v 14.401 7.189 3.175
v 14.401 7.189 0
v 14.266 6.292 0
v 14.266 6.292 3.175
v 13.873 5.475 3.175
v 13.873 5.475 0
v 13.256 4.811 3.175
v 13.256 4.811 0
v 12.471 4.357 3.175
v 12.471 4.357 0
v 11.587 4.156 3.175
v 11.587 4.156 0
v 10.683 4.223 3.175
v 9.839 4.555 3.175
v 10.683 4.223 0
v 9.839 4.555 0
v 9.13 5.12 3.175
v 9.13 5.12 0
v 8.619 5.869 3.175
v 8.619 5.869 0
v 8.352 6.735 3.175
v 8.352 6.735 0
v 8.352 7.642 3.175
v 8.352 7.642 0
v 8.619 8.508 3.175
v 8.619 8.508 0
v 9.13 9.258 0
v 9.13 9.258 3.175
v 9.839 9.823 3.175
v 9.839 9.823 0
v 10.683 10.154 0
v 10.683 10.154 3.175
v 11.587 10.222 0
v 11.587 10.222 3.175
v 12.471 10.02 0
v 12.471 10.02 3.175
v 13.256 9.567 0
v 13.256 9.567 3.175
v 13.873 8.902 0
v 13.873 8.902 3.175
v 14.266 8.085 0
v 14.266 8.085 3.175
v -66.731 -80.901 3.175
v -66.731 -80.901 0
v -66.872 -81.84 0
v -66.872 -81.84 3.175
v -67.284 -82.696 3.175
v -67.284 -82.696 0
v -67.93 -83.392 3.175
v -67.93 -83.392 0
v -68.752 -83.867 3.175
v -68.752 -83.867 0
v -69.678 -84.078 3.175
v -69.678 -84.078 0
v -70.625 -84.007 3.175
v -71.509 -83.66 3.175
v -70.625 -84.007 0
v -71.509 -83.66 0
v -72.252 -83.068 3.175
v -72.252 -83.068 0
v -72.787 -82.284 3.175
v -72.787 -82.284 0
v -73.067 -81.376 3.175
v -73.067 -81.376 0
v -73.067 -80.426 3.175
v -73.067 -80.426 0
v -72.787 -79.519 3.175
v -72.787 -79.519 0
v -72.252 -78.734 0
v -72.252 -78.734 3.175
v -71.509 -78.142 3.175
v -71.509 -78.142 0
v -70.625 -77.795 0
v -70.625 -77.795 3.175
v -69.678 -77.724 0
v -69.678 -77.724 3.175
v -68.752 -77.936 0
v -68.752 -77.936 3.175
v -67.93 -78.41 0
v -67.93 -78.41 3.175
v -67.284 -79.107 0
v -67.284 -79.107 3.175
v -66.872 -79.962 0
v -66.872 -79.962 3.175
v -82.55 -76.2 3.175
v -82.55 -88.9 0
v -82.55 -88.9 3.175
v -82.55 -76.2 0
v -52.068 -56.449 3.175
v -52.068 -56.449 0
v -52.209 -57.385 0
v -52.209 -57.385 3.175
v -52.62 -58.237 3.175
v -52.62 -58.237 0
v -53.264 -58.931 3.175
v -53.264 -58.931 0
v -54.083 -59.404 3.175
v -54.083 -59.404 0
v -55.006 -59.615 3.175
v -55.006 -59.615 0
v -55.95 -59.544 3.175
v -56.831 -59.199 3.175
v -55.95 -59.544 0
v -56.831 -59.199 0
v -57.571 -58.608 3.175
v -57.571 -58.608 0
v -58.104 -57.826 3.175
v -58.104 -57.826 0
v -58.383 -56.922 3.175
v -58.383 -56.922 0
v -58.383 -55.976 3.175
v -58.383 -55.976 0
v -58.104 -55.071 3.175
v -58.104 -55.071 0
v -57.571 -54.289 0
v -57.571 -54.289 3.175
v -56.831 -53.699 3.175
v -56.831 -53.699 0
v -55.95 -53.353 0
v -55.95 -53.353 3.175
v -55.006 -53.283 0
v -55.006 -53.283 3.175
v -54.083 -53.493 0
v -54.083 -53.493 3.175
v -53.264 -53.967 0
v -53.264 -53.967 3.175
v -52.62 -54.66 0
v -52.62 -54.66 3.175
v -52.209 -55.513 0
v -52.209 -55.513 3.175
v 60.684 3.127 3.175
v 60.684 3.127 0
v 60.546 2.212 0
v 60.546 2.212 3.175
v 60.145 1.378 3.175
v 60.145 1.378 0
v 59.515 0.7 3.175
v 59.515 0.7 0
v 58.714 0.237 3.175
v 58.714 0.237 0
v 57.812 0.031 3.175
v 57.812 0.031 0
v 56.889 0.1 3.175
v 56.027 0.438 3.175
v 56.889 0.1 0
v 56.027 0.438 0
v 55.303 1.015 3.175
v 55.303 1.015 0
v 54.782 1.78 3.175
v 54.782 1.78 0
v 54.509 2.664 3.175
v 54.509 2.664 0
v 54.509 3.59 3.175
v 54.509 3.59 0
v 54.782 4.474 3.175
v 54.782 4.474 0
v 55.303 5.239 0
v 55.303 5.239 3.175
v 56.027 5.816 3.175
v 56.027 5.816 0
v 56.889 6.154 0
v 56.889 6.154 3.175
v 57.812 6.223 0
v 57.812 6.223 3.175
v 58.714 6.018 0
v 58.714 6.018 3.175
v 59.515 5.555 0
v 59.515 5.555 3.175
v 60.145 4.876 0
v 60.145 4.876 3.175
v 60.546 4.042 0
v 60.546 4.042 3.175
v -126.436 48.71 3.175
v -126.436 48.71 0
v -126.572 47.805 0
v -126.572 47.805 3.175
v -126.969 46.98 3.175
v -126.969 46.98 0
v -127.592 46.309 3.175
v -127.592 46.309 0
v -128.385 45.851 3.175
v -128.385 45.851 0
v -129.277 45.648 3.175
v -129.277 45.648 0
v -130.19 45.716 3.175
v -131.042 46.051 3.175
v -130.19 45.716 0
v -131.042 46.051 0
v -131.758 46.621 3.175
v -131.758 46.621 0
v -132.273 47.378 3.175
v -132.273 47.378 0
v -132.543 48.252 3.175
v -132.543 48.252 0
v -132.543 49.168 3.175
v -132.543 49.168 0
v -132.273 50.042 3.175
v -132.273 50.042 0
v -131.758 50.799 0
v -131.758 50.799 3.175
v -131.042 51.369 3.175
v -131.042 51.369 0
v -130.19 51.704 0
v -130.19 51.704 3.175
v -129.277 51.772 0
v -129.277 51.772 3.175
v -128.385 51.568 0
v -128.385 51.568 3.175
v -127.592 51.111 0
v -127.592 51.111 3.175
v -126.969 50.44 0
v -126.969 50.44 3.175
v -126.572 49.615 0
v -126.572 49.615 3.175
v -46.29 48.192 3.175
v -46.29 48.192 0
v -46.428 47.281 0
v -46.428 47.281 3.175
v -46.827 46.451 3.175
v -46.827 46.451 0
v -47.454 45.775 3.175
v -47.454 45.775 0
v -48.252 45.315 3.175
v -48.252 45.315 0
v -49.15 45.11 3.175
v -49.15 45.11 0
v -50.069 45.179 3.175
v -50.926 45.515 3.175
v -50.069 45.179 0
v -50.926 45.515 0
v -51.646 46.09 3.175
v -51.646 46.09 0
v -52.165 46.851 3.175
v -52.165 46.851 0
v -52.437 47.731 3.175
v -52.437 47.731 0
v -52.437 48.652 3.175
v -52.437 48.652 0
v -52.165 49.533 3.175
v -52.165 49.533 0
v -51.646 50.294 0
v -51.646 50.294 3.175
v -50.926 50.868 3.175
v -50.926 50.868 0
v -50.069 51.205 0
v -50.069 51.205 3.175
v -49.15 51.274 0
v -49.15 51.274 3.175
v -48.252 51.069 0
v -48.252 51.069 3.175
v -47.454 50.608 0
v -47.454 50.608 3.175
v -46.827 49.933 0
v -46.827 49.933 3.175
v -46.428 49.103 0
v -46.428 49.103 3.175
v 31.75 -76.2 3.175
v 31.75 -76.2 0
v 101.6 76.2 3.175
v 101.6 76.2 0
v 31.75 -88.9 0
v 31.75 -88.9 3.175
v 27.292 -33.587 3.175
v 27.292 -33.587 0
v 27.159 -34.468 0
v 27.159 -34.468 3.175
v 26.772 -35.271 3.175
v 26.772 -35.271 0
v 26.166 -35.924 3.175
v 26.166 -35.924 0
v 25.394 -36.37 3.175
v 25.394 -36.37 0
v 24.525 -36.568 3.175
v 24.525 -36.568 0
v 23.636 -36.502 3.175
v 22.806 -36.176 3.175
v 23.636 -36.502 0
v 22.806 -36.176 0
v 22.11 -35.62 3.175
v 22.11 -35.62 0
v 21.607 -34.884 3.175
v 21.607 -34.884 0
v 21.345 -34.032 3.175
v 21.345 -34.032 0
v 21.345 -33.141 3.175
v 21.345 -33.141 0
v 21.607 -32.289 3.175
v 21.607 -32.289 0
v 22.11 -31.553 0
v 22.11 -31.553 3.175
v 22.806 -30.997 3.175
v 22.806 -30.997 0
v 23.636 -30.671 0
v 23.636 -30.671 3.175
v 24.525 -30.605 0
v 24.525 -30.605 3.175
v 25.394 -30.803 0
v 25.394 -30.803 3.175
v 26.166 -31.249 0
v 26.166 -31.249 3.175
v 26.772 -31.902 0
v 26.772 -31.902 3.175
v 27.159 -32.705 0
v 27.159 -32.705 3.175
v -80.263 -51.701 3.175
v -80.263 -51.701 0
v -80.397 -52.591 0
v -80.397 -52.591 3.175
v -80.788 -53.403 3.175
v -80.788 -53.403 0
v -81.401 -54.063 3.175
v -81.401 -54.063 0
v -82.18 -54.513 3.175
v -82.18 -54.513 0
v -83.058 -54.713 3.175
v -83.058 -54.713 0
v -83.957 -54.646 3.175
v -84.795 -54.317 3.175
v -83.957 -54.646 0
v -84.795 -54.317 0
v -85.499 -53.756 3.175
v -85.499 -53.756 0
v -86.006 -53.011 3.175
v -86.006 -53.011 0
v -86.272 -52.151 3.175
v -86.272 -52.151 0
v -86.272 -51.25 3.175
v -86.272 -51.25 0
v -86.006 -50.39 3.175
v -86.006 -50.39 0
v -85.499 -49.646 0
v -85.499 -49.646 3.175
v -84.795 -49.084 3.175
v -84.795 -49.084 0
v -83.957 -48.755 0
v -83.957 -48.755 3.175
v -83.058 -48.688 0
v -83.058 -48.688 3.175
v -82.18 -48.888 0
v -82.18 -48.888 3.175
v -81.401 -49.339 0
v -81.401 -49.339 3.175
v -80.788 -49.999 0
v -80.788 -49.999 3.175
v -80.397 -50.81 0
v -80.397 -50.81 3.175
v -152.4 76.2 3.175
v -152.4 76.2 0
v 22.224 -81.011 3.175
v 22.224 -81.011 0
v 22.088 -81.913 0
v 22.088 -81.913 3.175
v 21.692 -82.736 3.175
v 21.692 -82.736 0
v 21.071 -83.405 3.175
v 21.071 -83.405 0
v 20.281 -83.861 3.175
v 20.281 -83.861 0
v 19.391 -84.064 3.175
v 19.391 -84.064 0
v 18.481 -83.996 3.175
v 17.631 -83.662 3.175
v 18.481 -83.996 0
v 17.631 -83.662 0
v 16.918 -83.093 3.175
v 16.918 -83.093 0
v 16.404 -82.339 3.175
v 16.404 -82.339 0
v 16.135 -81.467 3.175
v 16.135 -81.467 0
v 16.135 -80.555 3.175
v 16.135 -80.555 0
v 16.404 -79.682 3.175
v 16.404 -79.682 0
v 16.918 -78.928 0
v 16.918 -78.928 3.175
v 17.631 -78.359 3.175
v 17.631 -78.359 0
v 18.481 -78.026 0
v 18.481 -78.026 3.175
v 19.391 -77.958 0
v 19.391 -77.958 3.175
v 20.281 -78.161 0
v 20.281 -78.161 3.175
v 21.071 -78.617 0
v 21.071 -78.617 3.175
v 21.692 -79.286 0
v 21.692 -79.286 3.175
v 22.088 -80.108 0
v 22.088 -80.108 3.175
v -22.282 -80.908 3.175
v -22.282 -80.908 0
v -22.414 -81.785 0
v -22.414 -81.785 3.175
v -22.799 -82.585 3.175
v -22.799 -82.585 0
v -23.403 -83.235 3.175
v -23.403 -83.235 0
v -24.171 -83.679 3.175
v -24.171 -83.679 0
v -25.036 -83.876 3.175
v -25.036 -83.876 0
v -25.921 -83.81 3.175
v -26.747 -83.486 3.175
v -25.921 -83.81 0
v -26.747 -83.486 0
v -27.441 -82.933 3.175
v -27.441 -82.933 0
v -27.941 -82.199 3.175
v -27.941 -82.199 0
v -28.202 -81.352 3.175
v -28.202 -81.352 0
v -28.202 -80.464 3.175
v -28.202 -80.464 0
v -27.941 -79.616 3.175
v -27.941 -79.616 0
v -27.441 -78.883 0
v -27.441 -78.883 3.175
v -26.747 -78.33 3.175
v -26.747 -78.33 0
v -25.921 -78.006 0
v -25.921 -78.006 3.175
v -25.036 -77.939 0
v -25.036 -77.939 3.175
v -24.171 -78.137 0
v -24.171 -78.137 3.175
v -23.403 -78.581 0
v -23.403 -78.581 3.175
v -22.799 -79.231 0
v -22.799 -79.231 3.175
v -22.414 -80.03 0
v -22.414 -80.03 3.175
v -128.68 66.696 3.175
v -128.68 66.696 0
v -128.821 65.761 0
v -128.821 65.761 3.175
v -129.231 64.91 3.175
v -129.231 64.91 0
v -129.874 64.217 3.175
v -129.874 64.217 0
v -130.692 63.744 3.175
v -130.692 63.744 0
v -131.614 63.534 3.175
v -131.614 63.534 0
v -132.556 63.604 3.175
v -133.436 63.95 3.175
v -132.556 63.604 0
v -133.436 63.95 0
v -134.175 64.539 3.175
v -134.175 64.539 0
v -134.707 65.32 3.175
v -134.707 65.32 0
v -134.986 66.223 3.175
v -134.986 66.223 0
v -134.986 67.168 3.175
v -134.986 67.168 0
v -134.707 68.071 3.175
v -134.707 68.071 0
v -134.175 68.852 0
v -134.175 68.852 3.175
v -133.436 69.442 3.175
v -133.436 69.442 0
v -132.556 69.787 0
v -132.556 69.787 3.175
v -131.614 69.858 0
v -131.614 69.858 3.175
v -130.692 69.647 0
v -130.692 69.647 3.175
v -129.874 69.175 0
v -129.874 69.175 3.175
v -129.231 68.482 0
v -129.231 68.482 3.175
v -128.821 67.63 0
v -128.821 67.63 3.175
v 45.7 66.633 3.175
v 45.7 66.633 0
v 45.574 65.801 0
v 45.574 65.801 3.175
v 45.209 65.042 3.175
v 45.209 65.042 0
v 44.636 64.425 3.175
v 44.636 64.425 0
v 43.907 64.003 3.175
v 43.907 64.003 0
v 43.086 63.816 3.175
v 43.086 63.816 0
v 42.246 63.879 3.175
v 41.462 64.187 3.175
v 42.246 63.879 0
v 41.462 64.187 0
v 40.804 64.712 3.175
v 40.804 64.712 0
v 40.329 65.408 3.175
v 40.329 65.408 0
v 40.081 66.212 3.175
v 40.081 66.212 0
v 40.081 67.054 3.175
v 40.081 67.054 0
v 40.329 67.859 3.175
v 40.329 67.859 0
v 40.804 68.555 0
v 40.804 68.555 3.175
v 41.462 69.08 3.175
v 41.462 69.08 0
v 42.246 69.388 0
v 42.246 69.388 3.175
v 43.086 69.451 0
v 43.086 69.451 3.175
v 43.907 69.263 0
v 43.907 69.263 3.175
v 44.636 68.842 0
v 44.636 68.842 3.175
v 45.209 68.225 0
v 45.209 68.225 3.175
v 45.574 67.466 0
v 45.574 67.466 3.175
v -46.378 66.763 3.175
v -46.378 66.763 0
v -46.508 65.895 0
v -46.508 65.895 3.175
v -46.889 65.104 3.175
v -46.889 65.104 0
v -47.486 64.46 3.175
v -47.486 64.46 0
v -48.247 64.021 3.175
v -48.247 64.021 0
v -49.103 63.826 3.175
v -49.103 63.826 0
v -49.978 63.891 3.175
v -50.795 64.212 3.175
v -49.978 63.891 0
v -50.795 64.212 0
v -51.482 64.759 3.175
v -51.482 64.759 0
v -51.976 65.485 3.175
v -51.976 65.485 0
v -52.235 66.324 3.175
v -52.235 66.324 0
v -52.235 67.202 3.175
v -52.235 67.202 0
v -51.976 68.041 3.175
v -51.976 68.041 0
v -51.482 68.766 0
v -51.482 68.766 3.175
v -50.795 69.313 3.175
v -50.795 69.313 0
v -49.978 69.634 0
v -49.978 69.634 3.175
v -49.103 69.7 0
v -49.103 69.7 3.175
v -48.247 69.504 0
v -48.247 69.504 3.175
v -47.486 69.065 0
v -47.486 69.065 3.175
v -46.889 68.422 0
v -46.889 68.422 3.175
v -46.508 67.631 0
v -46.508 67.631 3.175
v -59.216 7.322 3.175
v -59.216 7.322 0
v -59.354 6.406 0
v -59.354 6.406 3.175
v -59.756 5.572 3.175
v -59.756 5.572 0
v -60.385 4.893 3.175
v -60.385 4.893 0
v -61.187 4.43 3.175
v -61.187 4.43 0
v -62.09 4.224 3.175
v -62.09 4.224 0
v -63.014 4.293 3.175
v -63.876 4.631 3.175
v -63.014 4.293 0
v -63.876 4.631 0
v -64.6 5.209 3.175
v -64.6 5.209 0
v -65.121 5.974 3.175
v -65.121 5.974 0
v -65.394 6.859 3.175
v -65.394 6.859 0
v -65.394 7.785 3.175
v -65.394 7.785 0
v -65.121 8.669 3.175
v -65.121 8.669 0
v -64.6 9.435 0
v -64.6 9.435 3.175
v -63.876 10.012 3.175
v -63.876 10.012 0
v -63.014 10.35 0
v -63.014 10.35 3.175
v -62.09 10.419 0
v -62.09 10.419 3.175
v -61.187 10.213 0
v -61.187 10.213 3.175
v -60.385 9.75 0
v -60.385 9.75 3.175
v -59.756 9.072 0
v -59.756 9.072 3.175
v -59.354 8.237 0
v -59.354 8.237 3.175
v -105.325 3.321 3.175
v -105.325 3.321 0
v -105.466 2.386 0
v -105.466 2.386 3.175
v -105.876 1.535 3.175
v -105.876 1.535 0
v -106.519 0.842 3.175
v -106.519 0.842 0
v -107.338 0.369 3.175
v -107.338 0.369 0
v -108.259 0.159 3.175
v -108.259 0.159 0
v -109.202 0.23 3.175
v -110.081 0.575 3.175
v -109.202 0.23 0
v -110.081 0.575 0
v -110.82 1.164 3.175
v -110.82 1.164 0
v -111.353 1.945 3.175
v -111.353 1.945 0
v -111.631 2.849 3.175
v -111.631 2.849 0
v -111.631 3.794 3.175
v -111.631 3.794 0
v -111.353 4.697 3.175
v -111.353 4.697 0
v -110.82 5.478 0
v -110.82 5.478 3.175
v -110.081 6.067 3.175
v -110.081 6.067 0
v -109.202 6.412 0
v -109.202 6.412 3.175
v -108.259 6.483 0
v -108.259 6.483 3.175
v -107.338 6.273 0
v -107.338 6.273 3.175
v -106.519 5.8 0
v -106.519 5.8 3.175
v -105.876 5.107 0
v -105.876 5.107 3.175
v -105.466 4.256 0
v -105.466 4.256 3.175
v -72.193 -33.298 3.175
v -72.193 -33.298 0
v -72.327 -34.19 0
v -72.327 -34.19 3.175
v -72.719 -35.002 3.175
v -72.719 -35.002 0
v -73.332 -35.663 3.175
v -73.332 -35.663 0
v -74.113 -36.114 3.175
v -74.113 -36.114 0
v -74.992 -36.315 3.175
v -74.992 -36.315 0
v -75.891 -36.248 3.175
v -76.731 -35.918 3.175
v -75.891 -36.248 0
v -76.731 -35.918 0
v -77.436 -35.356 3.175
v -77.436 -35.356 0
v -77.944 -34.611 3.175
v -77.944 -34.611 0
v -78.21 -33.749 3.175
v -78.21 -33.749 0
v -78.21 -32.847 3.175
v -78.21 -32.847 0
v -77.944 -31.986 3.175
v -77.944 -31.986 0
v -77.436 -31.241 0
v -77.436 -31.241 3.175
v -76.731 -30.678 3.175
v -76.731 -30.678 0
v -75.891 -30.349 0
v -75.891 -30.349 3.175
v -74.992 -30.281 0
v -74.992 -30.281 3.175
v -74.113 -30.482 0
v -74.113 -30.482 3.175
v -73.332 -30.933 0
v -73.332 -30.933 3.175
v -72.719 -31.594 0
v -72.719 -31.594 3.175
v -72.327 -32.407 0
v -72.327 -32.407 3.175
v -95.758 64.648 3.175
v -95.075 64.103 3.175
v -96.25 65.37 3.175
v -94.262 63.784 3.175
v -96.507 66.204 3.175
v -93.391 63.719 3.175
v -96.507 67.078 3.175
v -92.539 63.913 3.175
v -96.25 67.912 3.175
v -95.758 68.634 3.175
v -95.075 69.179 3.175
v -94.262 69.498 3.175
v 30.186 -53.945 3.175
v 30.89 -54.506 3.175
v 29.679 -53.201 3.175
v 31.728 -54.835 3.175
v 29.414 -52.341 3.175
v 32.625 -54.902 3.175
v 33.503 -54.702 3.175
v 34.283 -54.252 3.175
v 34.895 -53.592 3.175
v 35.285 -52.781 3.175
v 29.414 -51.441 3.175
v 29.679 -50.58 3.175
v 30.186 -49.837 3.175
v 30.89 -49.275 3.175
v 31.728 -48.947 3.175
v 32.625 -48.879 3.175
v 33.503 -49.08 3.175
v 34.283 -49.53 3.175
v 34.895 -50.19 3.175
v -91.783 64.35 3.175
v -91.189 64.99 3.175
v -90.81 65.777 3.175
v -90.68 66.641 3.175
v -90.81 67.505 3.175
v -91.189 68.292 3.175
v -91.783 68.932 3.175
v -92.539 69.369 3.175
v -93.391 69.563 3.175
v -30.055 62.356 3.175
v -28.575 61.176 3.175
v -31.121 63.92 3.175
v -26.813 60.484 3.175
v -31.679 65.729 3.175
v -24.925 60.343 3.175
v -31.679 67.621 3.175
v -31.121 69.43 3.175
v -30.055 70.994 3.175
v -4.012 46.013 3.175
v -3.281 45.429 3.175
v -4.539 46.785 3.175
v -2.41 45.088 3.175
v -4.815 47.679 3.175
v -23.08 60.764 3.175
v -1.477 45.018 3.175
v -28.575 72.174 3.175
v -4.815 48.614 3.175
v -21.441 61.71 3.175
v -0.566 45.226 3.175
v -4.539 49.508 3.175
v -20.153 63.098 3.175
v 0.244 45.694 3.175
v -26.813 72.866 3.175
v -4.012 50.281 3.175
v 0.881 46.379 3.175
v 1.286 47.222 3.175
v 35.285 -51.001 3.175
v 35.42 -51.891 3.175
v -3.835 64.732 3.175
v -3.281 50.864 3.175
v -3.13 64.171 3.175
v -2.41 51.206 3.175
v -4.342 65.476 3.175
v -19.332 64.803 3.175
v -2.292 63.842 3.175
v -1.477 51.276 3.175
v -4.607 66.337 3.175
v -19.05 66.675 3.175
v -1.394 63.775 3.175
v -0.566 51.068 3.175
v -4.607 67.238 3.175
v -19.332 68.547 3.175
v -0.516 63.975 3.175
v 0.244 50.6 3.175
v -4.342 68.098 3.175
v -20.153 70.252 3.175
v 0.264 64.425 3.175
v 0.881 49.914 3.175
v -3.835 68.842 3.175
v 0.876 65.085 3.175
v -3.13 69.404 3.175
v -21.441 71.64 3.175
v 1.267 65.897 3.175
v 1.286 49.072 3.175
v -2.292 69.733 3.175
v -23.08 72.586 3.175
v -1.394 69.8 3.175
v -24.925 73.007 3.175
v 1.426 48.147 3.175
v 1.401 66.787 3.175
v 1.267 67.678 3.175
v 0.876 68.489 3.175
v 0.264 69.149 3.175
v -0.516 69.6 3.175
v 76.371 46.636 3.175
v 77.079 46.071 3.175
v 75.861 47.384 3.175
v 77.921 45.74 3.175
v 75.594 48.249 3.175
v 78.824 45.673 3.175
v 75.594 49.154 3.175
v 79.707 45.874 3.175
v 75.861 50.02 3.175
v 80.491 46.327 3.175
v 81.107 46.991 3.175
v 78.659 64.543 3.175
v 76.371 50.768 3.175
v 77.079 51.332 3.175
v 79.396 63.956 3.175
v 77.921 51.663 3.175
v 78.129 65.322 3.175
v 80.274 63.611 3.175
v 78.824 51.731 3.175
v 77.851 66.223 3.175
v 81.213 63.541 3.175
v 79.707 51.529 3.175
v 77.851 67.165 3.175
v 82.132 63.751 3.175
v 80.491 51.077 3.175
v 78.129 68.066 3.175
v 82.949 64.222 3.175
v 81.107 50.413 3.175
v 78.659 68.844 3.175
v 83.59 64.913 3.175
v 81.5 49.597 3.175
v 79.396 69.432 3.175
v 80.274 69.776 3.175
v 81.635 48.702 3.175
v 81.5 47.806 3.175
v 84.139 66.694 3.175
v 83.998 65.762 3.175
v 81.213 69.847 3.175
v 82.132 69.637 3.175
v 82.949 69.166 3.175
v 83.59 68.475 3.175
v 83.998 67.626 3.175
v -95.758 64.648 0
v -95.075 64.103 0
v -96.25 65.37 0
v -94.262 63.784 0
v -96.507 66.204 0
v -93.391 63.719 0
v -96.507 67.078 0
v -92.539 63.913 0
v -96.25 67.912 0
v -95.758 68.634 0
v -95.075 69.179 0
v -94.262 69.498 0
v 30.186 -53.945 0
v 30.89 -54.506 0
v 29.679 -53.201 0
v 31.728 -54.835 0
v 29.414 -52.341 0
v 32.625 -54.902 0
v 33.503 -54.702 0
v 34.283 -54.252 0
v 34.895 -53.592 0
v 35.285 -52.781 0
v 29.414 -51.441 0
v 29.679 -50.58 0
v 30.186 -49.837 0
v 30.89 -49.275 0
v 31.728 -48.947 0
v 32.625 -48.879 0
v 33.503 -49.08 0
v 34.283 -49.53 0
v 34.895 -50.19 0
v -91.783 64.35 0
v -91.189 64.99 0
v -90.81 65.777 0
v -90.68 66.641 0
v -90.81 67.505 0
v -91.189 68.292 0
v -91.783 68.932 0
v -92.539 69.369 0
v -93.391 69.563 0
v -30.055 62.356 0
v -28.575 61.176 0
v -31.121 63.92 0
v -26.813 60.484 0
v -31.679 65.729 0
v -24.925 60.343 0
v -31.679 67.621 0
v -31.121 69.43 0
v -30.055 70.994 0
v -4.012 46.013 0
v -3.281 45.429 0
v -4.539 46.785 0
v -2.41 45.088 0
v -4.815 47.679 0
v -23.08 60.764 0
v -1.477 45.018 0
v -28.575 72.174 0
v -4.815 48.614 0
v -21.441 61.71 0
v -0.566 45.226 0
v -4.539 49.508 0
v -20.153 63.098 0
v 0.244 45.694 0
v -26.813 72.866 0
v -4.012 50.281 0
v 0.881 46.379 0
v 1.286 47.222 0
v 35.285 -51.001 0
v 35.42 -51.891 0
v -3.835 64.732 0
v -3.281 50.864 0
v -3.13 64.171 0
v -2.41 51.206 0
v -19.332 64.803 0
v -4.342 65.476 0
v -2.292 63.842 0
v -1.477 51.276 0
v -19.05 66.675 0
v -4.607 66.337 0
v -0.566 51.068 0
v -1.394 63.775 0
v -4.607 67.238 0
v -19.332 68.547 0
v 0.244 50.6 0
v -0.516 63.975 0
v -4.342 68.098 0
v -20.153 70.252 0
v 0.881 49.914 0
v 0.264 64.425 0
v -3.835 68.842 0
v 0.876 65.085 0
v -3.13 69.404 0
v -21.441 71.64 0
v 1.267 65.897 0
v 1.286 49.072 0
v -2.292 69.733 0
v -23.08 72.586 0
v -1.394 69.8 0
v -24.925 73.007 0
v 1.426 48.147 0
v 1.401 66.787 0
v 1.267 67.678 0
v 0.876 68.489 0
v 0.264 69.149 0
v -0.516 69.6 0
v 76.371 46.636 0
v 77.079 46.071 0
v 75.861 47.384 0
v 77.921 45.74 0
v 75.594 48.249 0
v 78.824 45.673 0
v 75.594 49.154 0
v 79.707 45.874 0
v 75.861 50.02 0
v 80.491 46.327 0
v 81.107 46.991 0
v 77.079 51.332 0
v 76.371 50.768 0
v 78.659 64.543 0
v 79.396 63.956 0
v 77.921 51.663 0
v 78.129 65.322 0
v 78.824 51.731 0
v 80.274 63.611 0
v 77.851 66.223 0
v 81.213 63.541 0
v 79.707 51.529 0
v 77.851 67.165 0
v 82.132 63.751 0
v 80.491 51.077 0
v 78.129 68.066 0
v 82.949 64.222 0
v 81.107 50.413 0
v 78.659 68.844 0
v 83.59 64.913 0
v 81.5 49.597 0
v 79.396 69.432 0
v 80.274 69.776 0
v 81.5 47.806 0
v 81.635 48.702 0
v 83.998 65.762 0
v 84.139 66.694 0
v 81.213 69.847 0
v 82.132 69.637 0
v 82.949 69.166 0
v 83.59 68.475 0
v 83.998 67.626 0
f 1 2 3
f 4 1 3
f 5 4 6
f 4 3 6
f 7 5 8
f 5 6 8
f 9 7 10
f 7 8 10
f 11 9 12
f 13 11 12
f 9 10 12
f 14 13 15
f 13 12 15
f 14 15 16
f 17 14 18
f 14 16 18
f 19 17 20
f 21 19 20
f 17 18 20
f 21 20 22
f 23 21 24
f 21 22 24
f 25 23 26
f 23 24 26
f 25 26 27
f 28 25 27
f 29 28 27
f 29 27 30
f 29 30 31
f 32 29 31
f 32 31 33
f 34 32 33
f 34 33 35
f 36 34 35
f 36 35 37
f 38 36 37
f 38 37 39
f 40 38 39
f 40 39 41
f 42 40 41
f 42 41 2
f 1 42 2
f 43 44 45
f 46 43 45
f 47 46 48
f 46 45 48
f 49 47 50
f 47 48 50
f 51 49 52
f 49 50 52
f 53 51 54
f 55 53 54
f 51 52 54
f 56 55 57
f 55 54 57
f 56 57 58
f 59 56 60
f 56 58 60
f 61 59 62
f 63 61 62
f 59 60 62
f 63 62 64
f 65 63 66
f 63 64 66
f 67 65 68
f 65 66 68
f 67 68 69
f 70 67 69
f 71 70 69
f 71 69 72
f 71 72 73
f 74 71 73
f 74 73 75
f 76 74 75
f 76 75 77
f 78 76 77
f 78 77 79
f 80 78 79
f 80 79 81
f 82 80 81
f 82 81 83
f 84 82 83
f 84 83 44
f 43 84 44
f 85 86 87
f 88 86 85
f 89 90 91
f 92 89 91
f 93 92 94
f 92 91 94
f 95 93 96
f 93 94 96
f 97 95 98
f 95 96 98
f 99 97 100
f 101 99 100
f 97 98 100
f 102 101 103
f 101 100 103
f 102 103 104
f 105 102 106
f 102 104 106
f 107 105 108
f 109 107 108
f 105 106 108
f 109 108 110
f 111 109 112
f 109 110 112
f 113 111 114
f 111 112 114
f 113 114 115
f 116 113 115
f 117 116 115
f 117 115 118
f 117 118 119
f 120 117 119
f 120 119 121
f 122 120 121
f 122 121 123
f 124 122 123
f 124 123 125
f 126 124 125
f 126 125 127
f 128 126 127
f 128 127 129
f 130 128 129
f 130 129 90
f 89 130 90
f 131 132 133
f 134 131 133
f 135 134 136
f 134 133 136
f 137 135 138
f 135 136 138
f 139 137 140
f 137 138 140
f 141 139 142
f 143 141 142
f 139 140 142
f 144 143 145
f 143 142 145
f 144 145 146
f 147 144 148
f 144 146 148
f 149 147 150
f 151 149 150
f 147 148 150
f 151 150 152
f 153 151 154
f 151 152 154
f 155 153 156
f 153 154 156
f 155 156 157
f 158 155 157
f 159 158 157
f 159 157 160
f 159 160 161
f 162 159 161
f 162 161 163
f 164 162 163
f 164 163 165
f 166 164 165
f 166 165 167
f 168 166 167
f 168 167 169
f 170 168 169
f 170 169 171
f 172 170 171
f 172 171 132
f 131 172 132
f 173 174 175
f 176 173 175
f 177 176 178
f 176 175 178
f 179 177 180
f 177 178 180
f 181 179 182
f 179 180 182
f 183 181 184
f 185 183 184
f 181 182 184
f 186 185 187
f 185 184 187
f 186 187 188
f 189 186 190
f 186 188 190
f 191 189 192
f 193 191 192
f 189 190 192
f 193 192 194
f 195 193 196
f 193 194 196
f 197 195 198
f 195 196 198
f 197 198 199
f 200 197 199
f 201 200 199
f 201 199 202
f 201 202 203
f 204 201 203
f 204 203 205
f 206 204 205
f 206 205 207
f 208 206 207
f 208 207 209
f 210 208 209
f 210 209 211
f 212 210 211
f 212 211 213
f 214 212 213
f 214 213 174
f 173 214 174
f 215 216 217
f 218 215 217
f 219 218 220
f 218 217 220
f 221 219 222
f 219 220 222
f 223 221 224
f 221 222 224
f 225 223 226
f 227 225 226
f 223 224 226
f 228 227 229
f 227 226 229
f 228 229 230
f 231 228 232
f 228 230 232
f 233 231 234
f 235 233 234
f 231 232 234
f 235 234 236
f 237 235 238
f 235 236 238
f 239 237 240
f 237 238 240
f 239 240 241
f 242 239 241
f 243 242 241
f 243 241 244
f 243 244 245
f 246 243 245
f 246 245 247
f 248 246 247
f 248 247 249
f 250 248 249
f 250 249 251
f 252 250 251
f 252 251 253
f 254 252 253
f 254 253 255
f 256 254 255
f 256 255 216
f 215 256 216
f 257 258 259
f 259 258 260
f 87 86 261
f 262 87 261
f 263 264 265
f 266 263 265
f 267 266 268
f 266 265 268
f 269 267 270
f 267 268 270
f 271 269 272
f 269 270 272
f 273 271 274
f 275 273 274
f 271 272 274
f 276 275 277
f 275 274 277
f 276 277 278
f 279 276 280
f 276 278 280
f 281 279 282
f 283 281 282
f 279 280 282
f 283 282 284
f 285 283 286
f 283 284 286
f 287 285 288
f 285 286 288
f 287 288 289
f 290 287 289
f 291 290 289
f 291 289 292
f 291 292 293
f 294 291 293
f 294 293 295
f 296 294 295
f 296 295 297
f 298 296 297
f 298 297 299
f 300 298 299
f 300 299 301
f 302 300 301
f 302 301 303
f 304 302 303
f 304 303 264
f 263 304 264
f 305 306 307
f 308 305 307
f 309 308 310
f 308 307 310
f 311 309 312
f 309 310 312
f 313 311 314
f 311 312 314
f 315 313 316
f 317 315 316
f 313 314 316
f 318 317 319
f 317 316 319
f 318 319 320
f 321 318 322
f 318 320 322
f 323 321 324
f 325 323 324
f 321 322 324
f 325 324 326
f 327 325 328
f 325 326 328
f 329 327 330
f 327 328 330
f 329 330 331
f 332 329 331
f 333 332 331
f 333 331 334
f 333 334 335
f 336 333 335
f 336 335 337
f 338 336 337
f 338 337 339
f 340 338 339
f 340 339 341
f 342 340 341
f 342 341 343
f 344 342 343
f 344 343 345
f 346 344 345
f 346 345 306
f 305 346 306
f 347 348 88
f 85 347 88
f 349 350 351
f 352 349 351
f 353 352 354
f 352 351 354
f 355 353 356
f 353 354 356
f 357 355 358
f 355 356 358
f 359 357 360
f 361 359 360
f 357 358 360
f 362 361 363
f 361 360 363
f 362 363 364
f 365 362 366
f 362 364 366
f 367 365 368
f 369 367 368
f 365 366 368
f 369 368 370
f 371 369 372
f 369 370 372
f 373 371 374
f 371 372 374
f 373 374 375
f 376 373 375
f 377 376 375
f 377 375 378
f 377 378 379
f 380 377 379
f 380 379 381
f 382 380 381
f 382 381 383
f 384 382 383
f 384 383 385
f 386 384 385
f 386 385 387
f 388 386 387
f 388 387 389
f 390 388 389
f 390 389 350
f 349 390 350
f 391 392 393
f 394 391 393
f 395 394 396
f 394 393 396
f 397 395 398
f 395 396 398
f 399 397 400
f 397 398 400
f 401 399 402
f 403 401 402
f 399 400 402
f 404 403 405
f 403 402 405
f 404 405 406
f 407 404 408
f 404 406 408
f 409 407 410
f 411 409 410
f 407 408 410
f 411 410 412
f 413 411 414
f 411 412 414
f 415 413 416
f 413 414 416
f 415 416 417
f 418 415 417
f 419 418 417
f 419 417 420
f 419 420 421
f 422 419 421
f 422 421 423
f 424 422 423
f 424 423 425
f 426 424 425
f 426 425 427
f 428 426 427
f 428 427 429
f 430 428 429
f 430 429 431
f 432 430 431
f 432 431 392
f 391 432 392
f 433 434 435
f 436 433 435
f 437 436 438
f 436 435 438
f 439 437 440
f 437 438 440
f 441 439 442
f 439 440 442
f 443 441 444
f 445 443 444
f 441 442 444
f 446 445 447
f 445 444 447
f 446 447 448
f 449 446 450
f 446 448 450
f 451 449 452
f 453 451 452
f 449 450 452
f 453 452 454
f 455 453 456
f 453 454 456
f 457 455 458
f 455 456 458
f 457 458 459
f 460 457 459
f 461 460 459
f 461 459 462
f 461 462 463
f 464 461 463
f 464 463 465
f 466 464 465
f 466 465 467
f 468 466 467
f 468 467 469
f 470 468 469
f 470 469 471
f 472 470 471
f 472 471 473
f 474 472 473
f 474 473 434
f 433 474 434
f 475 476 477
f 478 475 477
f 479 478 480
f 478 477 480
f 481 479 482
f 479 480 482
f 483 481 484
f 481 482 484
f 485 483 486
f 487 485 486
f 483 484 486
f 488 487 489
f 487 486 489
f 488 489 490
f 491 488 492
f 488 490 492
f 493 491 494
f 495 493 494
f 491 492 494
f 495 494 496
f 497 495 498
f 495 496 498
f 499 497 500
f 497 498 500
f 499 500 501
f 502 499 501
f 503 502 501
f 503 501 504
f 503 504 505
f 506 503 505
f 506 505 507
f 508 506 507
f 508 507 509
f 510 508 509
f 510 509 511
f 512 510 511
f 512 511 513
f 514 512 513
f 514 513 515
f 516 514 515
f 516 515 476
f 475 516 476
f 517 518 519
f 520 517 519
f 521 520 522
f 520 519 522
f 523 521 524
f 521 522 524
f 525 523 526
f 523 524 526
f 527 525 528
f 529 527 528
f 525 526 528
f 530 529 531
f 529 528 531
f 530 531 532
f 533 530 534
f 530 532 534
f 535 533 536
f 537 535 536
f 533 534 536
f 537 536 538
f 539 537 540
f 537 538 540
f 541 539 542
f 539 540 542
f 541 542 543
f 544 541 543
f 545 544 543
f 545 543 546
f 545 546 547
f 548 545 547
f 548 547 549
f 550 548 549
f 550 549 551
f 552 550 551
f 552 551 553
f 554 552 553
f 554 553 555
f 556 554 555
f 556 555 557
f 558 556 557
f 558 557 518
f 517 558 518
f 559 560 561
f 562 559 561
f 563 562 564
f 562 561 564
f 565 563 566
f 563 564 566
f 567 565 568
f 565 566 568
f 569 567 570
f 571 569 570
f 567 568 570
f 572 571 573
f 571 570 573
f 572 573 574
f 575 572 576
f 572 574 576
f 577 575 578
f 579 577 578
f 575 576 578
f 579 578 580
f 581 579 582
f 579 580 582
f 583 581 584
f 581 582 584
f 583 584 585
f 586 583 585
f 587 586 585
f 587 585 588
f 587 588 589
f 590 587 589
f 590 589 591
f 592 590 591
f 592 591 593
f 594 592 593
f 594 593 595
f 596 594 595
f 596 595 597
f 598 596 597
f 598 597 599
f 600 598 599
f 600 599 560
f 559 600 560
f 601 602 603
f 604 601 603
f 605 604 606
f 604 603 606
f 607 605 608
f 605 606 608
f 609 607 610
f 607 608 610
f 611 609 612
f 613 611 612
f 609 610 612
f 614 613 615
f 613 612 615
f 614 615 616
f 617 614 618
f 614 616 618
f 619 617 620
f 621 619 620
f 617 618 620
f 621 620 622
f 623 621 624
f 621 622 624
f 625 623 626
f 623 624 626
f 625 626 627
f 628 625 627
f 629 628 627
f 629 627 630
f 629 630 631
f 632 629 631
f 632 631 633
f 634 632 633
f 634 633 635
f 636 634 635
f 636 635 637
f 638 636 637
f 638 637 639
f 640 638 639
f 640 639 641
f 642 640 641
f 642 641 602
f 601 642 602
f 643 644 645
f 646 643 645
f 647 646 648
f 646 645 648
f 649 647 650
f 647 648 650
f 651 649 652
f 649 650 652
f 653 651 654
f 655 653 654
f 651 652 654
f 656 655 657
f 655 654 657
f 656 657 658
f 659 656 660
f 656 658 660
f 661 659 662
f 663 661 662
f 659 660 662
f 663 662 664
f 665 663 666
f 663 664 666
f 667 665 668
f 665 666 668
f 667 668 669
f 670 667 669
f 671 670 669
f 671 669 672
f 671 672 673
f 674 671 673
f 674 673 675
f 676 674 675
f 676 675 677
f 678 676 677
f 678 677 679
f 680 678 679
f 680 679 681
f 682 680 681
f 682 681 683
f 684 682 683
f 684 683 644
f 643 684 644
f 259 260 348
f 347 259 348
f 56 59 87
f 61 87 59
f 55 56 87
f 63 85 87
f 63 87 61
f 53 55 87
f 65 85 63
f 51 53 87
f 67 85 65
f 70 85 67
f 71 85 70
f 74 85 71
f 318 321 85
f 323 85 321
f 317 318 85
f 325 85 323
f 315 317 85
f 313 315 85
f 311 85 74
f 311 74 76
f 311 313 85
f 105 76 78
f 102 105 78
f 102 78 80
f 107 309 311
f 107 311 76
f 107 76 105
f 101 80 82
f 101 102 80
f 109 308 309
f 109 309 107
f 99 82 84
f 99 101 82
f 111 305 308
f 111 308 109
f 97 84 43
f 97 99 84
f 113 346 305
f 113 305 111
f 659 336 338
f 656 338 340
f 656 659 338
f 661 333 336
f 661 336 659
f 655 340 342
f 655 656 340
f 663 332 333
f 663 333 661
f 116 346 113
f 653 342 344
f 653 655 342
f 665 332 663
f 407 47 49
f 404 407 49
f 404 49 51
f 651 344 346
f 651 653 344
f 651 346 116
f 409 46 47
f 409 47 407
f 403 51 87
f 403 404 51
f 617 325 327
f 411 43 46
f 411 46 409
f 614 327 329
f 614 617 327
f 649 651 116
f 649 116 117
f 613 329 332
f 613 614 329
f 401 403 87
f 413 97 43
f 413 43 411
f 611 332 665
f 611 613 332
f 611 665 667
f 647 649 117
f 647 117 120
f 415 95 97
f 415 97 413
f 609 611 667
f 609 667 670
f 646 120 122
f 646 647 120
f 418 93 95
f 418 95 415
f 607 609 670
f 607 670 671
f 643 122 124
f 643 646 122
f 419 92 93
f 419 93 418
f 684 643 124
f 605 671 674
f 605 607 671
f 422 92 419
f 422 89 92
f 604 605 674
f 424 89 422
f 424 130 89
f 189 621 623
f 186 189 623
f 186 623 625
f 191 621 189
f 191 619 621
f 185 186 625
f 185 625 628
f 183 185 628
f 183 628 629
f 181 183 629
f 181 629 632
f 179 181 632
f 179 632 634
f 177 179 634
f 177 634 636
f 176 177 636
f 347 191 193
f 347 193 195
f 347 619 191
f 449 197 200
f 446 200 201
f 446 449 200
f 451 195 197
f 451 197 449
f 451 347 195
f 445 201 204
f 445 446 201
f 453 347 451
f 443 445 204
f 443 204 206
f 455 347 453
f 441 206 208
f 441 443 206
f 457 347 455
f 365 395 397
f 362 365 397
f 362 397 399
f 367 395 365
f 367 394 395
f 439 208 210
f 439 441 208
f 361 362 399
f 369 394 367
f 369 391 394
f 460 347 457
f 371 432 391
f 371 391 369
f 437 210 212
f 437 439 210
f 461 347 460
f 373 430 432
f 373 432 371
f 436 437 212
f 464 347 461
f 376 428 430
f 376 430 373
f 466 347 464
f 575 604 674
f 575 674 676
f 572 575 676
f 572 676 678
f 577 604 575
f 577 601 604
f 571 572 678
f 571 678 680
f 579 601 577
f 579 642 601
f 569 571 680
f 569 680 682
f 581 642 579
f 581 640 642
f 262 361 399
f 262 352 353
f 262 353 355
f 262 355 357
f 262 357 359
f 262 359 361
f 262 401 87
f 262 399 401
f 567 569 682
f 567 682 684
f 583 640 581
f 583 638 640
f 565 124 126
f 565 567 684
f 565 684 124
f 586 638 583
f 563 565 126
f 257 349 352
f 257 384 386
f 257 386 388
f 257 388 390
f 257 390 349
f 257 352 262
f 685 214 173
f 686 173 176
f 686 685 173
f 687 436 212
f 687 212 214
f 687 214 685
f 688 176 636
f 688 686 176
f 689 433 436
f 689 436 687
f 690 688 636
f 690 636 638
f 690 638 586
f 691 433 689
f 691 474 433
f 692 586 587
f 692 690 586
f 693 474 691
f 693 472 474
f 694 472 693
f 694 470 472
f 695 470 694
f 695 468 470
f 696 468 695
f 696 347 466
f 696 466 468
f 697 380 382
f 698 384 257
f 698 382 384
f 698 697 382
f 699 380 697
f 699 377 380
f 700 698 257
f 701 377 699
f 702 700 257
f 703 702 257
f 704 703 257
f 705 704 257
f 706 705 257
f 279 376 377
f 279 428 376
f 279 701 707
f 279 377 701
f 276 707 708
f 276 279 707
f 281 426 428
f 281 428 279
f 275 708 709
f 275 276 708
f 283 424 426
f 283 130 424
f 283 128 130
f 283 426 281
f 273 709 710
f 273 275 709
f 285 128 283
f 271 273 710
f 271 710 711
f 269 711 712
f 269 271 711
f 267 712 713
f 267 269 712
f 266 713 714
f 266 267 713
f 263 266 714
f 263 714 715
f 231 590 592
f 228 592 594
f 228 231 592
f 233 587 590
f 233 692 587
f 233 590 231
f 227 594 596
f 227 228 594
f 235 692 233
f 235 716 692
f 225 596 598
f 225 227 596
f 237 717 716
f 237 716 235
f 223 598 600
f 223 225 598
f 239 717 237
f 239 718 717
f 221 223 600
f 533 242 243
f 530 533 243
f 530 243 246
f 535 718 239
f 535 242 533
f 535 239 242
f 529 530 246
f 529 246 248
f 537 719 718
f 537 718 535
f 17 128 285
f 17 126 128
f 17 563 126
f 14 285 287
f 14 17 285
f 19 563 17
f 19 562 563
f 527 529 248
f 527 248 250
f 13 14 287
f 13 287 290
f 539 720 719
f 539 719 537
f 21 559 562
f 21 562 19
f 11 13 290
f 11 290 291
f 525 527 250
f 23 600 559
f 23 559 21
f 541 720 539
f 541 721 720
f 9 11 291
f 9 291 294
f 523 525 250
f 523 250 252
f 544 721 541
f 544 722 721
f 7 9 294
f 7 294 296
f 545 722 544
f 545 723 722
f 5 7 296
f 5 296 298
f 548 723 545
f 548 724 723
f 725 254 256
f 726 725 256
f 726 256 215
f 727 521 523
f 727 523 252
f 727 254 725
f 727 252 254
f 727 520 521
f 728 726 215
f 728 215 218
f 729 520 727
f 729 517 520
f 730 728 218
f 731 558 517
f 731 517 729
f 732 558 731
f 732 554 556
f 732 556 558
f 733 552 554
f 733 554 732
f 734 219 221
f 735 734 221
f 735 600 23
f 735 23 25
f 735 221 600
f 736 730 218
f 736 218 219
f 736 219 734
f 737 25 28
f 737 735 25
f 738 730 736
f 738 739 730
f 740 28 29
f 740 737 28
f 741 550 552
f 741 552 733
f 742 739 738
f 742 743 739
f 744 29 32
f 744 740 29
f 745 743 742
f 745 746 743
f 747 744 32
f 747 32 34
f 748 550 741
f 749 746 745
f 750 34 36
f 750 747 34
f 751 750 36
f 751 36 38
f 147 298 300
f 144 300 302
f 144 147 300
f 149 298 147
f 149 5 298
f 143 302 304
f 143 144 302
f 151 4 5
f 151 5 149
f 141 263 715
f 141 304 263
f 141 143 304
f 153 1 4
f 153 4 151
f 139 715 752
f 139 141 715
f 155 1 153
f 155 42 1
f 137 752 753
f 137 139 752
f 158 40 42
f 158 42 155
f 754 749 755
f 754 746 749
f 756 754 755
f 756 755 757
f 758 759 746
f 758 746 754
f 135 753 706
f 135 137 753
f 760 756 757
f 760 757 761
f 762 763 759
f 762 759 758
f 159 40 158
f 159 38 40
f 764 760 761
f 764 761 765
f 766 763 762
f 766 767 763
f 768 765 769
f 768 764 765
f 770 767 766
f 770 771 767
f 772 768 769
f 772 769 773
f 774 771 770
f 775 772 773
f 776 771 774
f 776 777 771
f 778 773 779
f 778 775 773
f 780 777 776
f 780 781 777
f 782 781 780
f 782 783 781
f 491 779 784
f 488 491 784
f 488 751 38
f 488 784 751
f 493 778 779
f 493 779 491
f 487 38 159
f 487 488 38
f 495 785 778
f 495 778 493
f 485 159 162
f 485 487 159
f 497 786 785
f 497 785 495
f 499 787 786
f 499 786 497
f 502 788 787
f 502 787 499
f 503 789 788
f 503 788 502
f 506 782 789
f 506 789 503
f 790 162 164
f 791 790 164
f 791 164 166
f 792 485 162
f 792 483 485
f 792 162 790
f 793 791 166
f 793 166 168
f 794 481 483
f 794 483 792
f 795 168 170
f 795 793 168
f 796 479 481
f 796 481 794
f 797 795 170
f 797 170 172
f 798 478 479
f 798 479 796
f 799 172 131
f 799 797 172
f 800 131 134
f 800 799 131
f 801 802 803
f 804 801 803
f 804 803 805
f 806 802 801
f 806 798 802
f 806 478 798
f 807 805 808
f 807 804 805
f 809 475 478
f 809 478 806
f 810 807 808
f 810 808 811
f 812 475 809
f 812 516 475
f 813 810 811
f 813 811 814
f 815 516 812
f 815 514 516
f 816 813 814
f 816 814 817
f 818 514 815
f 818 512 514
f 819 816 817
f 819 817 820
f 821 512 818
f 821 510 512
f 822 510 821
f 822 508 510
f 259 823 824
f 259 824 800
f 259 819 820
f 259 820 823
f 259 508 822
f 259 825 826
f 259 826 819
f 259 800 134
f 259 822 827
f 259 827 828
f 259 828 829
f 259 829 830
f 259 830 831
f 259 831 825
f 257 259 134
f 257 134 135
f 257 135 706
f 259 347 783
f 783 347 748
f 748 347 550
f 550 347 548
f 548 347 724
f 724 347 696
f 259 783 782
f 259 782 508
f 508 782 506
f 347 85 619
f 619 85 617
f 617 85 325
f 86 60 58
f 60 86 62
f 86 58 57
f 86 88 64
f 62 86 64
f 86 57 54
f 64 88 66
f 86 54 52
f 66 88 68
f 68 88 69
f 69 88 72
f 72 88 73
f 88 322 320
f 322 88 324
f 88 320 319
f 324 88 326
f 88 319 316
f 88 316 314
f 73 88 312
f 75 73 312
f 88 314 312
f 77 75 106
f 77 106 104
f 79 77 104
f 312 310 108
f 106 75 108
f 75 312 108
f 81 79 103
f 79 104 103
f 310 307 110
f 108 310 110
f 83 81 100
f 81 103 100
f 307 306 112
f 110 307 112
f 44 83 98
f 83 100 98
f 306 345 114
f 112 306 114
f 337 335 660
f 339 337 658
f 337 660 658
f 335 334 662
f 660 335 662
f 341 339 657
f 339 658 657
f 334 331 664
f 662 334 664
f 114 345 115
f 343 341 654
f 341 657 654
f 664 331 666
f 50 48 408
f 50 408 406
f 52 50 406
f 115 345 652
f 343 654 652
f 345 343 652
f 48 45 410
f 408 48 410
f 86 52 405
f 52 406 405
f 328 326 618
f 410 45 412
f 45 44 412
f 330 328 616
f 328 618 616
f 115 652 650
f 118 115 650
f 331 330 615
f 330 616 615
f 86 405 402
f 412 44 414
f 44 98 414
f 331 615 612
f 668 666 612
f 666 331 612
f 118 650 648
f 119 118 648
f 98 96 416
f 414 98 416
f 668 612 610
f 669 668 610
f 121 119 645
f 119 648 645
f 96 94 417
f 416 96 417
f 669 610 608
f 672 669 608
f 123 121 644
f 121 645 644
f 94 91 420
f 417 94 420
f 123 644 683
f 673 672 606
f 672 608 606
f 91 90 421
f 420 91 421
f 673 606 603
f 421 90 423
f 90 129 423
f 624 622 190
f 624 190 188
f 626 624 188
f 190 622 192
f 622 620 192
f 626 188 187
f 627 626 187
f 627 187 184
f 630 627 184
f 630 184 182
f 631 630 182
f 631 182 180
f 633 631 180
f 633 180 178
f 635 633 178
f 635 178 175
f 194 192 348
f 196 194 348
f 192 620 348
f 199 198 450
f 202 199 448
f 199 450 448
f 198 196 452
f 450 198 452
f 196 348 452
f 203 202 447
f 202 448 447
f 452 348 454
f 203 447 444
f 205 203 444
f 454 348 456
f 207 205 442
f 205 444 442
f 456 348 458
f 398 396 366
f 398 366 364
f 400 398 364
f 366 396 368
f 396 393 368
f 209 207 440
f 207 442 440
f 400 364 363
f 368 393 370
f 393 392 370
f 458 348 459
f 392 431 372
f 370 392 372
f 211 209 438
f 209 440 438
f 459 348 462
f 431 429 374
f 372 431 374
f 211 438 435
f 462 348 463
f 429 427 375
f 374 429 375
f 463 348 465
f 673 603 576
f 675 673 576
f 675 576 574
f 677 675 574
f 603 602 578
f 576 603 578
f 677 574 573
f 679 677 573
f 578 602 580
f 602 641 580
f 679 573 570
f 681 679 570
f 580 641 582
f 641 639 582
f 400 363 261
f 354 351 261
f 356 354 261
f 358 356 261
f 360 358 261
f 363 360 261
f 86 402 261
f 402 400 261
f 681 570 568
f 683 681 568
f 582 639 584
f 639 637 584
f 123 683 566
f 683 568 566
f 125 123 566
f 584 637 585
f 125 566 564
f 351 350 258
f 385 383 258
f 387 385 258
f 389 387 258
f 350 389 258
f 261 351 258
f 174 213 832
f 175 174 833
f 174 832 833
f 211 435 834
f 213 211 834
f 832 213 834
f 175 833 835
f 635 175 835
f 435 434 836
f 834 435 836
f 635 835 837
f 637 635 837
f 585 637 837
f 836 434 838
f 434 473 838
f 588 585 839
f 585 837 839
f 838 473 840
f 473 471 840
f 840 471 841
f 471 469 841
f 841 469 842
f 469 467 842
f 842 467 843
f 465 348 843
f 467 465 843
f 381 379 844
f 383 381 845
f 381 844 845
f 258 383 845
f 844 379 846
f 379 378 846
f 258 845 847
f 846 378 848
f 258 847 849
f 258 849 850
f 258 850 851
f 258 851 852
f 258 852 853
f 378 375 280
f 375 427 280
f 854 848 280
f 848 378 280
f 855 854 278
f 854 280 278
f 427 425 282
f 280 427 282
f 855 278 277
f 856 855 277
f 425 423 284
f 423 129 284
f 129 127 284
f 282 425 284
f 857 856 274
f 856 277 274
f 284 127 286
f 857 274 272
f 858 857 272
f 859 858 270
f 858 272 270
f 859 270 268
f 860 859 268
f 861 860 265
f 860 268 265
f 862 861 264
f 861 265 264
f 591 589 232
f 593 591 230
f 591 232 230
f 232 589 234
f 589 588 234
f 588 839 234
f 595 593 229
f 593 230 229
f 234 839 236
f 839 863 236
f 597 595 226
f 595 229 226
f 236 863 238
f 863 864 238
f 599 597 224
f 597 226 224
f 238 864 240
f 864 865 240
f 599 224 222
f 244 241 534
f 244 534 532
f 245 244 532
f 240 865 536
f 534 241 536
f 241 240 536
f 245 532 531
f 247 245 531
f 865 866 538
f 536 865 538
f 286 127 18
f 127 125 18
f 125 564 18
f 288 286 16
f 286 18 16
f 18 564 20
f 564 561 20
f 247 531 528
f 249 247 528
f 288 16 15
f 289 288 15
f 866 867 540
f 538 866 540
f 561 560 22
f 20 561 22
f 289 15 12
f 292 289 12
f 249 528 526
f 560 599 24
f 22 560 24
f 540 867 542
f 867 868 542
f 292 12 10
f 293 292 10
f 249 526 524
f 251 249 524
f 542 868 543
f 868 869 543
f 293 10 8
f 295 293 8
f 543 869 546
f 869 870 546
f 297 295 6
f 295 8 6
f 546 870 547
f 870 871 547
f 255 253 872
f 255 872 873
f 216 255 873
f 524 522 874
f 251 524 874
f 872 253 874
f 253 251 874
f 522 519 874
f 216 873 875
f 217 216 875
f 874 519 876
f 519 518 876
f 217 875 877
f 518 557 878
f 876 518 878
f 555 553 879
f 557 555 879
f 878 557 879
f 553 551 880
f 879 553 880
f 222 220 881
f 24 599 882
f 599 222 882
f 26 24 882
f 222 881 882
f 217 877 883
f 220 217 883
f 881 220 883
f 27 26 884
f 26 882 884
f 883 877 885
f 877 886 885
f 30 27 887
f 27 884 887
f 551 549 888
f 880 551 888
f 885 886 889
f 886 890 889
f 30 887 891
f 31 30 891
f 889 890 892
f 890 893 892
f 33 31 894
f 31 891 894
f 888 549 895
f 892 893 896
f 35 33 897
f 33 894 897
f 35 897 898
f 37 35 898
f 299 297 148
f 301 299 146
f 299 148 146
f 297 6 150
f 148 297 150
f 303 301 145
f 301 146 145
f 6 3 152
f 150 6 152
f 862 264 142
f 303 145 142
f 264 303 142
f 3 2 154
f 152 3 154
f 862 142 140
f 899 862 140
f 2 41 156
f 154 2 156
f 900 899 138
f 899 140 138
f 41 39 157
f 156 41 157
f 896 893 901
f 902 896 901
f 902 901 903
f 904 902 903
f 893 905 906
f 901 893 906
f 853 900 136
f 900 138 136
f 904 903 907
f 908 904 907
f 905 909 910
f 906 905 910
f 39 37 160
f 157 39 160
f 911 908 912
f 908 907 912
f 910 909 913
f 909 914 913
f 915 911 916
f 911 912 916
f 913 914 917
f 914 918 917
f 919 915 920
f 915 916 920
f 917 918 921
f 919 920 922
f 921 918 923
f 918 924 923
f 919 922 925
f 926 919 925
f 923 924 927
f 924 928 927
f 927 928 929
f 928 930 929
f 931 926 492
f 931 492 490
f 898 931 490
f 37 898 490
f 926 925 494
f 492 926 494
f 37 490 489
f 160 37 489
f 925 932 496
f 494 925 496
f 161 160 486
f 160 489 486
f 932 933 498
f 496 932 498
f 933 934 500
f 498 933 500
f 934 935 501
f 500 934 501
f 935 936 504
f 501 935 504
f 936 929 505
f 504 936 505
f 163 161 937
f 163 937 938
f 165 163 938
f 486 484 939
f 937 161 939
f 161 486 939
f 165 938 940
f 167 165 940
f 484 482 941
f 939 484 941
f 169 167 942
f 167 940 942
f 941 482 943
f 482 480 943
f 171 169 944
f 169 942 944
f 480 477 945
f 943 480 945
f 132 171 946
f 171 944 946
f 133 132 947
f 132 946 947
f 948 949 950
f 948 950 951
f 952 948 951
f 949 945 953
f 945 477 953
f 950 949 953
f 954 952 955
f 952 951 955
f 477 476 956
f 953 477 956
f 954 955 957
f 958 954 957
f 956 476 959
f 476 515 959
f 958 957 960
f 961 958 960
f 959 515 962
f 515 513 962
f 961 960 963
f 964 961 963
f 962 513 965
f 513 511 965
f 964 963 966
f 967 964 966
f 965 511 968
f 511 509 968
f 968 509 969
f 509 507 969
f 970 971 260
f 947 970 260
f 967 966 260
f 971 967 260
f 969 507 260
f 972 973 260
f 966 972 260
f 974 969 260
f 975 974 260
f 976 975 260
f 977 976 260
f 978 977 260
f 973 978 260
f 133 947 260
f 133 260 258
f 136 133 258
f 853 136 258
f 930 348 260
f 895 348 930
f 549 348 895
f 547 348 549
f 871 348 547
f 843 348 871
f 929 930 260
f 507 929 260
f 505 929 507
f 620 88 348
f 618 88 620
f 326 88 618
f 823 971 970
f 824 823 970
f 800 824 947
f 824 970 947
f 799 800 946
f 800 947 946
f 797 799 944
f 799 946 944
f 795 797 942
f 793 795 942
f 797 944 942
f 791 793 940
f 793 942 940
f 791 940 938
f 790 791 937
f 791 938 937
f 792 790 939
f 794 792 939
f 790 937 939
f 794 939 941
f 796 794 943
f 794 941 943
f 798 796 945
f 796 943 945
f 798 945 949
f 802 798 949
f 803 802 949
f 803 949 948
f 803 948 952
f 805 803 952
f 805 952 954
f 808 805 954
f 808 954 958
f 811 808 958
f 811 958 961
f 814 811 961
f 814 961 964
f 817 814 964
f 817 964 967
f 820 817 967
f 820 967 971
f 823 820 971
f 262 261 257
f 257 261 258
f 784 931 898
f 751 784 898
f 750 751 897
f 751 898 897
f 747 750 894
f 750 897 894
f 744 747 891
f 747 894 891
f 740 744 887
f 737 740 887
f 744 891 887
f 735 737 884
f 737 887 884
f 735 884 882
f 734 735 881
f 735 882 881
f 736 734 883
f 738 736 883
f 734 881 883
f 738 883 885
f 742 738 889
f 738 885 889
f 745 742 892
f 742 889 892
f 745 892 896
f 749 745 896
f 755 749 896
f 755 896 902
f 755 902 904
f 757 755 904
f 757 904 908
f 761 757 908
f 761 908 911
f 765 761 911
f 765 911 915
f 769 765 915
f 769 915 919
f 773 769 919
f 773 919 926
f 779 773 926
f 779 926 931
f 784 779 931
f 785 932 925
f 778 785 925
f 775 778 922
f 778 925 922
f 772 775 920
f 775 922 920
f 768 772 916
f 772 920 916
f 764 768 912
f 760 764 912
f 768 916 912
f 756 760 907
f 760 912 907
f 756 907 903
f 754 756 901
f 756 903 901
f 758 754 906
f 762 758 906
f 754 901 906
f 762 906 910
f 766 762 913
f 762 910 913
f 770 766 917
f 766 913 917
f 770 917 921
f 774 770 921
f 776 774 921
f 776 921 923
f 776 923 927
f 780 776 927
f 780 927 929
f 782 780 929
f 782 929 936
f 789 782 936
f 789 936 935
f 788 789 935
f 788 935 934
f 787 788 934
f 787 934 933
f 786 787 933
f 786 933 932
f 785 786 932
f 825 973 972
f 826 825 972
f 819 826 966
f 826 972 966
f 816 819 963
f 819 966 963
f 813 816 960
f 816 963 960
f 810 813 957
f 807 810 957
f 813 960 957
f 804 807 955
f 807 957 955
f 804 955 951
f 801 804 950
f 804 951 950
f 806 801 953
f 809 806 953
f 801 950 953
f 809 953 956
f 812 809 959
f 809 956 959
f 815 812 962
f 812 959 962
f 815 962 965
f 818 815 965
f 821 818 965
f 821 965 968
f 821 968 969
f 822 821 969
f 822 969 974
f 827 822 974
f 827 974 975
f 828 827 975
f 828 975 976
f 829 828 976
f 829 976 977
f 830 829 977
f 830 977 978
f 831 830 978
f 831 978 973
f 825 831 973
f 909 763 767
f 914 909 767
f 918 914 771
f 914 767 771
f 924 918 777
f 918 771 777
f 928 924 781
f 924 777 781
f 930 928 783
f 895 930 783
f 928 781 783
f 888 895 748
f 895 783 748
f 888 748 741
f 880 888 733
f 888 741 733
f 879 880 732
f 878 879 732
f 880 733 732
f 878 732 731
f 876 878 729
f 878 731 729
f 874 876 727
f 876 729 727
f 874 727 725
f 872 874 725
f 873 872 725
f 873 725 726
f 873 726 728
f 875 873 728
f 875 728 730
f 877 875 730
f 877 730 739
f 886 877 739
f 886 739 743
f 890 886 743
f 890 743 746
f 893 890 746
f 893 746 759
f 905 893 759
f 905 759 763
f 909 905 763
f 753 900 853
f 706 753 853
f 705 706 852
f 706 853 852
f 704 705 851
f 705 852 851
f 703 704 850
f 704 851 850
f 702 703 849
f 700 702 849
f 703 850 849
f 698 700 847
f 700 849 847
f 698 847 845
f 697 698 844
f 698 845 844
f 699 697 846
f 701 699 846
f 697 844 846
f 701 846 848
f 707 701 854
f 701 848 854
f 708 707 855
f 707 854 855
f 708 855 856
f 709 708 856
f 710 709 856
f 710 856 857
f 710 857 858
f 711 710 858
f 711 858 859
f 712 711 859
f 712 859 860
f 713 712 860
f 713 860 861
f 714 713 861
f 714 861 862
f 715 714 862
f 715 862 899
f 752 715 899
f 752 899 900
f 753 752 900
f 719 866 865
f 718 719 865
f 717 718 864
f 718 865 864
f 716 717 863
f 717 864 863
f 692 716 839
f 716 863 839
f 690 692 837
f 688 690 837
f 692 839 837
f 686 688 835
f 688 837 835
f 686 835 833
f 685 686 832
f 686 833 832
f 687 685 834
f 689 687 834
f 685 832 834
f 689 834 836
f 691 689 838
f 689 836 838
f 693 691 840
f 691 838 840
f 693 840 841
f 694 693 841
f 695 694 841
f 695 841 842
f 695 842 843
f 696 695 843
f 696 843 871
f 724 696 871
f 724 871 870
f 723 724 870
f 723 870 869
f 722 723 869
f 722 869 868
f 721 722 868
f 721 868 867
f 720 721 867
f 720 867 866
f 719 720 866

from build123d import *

# Parameters (mm, degrees)
F0_W     = 114.3
F0_H     = 12.7
F1_DEPTH = 3.175
F2_R     = 6.35
F3_DEPTH = 25.4
F4_R     = 3.021184
F4_R_2   = 3.02523
F4_R_3   = 3.170788
F4_R_4   = 3.070755
F4_R_5   = 3.170798
F4_R_6   = 2.930153
F4_R_7   = 2.94527
F4_R_8   = 3.090546
F4_R_9   = 3.106591
F4_R_10  = 2.82513
F4_R_11  = 3.161756
F4_R_12  = 3.03759
F4_R_13  = 3.13771
F4_R_14  = 3.0417
F4_R_15  = 3.104919
F4_R_16  = 2.990317
F4_R_17  = 3.019885
F5_DEPTH = 25.4
F6_R     = 3.185907
F6_R_2   = 2.97679
F6_R_3   = 3.061714
F7_DEPTH = 25.4
F8_R     = 3.175
F9_DEPTH = 25.4


with BuildPart() as f1:
    # F0 (on Top) → F1 (new body)
    with BuildSketch(Plane.XY):
        Polygon((31.75, -76.2), (101.6, 76.2), (-152.4, 76.2), (-82.55, -76.2), align=None)
        with Locations((-25.4, -82.55)):
            Rectangle(F0_W, F0_H)
    extrude(amount=F1_DEPTH)

    # F2 (on face) → F3 (cut)
    with BuildSketch(Plane.XY.offset(3.175)):
        with Locations((-25.4, 66.675)):
            Circle(F2_R)
    extrude(amount=-F3_DEPTH, mode=Mode.SUBTRACT)

    # F4 (on face) → F5 (cut)
    with BuildSketch(Plane(origin=(0, 0, 0), x_dir=(1, 0, 0), z_dir=(0, 0, -1))):
        with Locations((-83.284251, 51.700644)):
            Circle(F4_R)
        with Locations((-75.218096, 33.298224)):
            Circle(F4_R_2)
        with Locations((-108.495958, -3.321084)):
            Circle(F4_R_3)
        with Locations((-129.506573, -48.709944)):
            Circle(F4_R_4)
        with Locations((-131.85069, -66.695675)):
            Circle(F4_R_5)
        with Locations((-93.609944, -66.641048)):
            Circle(F4_R_6)
        with Locations((-49.322799, -66.762716)):
            Circle(F4_R_7)
        with Locations((-49.380876, -48.191752)):
            Circle(F4_R_8)
        with Locations((-62.322322, -7.321586)):
            Circle(F4_R_9)
        with Locations((-1.619848, -66.78725)):
            Circle(F4_R)
        with Locations((42.874776, -66.633321)):
            Circle(F4_R_10)
        with Locations((80.977194, -66.69376)):
            Circle(F4_R_11)
        with Locations((78.597426, -48.701756)):
            Circle(F4_R_12)
        with Locations((-1.711915, -48.14671)):
            Circle(F4_R_13)
        with Locations((11.359618, -7.188707)):
            Circle(F4_R_14)
        with Locations((57.579476, -3.127213)):
            Circle(F4_R_15)
        with Locations((24.301577, 33.58651)):
            Circle(F4_R_16)
        with Locations((32.399718, 51.890686)):
            Circle(F4_R_17)
    extrude(amount=-F5_DEPTH, mode=Mode.SUBTRACT)

    # F6 (on face) → F7 (cut)
    with BuildSketch(Plane(origin=(0, 0, 0), x_dir=(1, 0, 0), z_dir=(0, 0, -1))):
        with Locations((-69.916442, 80.901213)):
            Circle(F6_R)
        with Locations((-25.25891, 80.907866)):
            Circle(F6_R_2)
        with Locations((19.162027, 81.010833)):
            Circle(F6_R_3)
    extrude(amount=-F7_DEPTH, mode=Mode.SUBTRACT)

    # F8 (on face) → F9 (cut)
    with BuildSketch(Plane(origin=(0, 0, 0), x_dir=(1, 0, 0), z_dir=(0, 0, -1))):
        with Locations((-55.243213, 56.448877)):
            Circle(F8_R)
    extrude(amount=-F9_DEPTH, mode=Mode.SUBTRACT)


solid = f1.part
